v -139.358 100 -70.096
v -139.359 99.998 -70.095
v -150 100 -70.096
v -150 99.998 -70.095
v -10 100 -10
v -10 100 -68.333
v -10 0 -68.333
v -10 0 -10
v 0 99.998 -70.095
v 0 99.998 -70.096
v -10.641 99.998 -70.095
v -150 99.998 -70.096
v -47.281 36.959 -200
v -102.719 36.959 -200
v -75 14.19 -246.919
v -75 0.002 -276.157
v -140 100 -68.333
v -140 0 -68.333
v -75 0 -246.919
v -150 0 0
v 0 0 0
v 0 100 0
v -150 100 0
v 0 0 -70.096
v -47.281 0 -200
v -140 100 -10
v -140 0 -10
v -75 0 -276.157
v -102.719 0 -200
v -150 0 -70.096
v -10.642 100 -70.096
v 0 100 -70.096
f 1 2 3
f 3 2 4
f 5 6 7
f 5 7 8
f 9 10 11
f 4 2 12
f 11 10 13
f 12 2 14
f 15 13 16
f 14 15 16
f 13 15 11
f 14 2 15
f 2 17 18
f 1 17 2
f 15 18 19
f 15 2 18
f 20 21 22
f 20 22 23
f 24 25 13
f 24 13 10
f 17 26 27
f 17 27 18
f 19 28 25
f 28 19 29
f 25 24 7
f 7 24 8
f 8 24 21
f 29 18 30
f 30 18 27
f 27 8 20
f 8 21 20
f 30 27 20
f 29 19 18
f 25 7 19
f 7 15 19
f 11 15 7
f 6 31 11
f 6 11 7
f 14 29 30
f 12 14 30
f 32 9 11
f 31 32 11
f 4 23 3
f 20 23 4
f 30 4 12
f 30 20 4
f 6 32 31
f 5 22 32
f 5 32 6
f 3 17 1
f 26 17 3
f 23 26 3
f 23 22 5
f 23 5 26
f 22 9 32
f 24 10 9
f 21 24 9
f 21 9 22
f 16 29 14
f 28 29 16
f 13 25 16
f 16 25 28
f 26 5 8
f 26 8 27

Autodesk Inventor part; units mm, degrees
ref_plane "YZ Plane" through (0, 0, 0) normal (1, 0, 0) x (0, 1, 0)
ref_plane "XZ Plane" through (0, 0, 0) normal (0, 1, 0) x (-1, 0, 0)
sketch "Sketch2" plane through (0, 0, 0) normal (0, 1, 0) x (-1, 0, 0)
  line L0 (0, 0) -> (150, 0)
  line L1 (150, 0) -> (150, -70.0962)
  line L2 (0, -70.0962) -> (0, 0)
  line L3 (102.7189, -200) -> (47.2811, -200)
  line L4 (102.7189, -200) -> (150, -70.0962)
  line L5 (47.2811, -200) -> (0, -70.0962)
  line L6 (0, -70.0962) -> (0, -200)
  line L7 (150, -70.0962) -> (150, -200)
  line L8 (0, -200) -> (150, -200)
  line L9 (102.7189, -200) -> (75, -276.157)
  line L10 (47.2811, -200) -> (75, -276.157)
  dimension "d7" = 150
  dimension "d23" = 70.0962
  dimension "d24" = 200
  dimension "d36" = 20
  dimension "d37" = 20
extrude "Extrusion1" add sketch "Sketch2" along normal blind 100 contours L0 L1 L4 L3 L5 L2 | L3 L9 L10
sketch "Sketch11" plane through (0, 100, 0) normal (0, 1, 0) x (1, 0, 0)
  line L0 (0, 70.0962) -> (-75, 276.157) projected
  line L1 (-75, 276.157) -> (-150, 70.0962) projected
  line L2 (-150, 70.0962) -> (-150, 0) projected
  line L3 (-150, 0) -> (0, 0) projected
  line L4 (0, 0) -> (0, 70.0962) projected
  line L5 (-10, 68.3329) -> (-75, 246.919)
  line L6 (-75, 246.919) -> (-140, 68.3329)
  line L7 (-140, 68.3329) -> (-140, 10)
  line L8 (-140, 10) -> (-10, 10)
  line L9 (-10, 10) -> (-10, 68.3329)
  dimension "d46" = 10
extrude "Extrusion9" cut sketch "Sketch11" against normal blind 90 contours L9 L8 L7 L6 L5
ref_plane "Work Plane4" through (0, 100, -70.0962) normal (0, -0.8997, 0.4366) x (-1, 0, 0)
sketch "Sketch12" plane through (0, 100, -70.0962) normal (0, -0.8997, 0.4366) x (-1, 0, 0)
  line L0 (0, 0) -> (154.5136, 0)
  line L1 (154.5136, 0) -> (154.5136, 238.9342)
  line L2 (154.5136, 238.9342) -> (0, 238.9342)
  line L3 (0, 238.9342) -> (0, 0)
  point P0 (0, -19.4027)
extrude "Extrusion10" cut sketch "Sketch12" against normal blind 90
sketch "Sketch13" plane through (0, 10, 0) normal (0, 1, 0) x (1, 0, 0)
  line L0 (-140, 10) -> (-140, 68.3329) projected
  line L1 (-10, 10) -> (-140, 10) projected
  line L2 (-10, 68.3329) -> (-10, 10) projected
  line L3 (-75, 246.919) -> (-10, 68.3329) projected
  line L4 (-140, 68.3329) -> (-75, 246.919) projected
  circle A0 centre (-75, 222.9149) radius 2.5
  line L5 (-75, 222.9149) -> (-10, 44.3288)
  line L6 (-75, 222.9149) -> (97.0532, 222.9149) construction
  line L7 (-75, 222.9149) -> (-140, 44.3288)
  circle A1 centre (-71.5798, 213.518) radius 2.5
  circle A2 centre (-68.1596, 204.121) radius 2.5
  circle A3 centre (-64.7394, 194.7241) radius 2.5
  circle A4 centre (-61.3192, 185.3272) radius 2.5
  circle A5 centre (-57.899, 175.9302) radius 2.5
  circle A6 centre (-54.4788, 166.5333) radius 2.5
  circle A7 centre (-51.0586, 157.1364) radius 2.5
  circle A8 centre (-47.6384, 147.7395) radius 2.5
  circle A9 centre (-44.2182, 138.3425) radius 2.5
  circle A10 centre (-40.798, 128.9456) radius 2.5
  circle A11 centre (-37.3778, 119.5487) radius 2.5
  circle A12 centre (-78.4202, 213.518) radius 2.5
  circle A13 centre (-75, 204.121) radius 2.5
  circle A14 centre (-71.5798, 194.7241) radius 2.5
  circle A15 centre (-68.1596, 185.3272) radius 2.5
  circle A16 centre (-64.7394, 175.9302) radius 2.5
  circle A17 centre (-61.3192, 166.5333) radius 2.5
  circle A18 centre (-57.899, 157.1364) radius 2.5
  circle A19 centre (-54.4788, 147.7395) radius 2.5
  circle A20 centre (-51.0586, 138.3425) radius 2.5
  circle A21 centre (-47.6384, 128.9456) radius 2.5
  circle A22 centre (-44.2182, 119.5487) radius 2.5
  circle A23 centre (-40.798, 110.1518) radius 2.5
  circle A24 centre (-81.8404, 204.121) radius 2.5
  circle A25 centre (-78.4202, 194.7241) radius 2.5
  circle A26 centre (-75, 185.3272) radius 2.5
  circle A27 centre (-71.5798, 175.9302) radius 2.5
  circle A28 centre (-68.1596, 166.5333) radius 2.5
  circle A29 centre (-64.7394, 157.1364) radius 2.5
  circle A30 centre (-61.3192, 147.7395) radius 2.5
  circle A31 centre (-57.899, 138.3425) radius 2.5
  circle A32 centre (-54.4788, 128.9456) radius 2.5
  circle A33 centre (-51.0586, 119.5487) radius 2.5
  circle A34 centre (-47.6384, 110.1518) radius 2.5
  circle A35 centre (-44.2182, 100.7548) radius 2.5
  circle A36 centre (-85.2606, 194.7241) radius 2.5
  circle A37 centre (-81.8404, 185.3272) radius 2.5
  circle A38 centre (-78.4202, 175.9302) radius 2.5
  circle A39 centre (-75, 166.5333) radius 2.5
  circle A40 centre (-71.5798, 157.1364) radius 2.5
  circle A41 centre (-68.1596, 147.7395) radius 2.5
  circle A42 centre (-64.7394, 138.3425) radius 2.5
  circle A43 centre (-61.3192, 128.9456) radius 2.5
  circle A44 centre (-57.899, 119.5487) radius 2.5
  circle A45 centre (-54.4788, 110.1518) radius 2.5
  circle A46 centre (-51.0586, 100.7548) radius 2.5
  circle A47 centre (-47.6384, 91.3579) radius 2.5
  circle A48 centre (-88.6808, 185.3272) radius 2.5
  circle A49 centre (-85.2606, 175.9302) radius 2.5
  circle A50 centre (-81.8404, 166.5333) radius 2.5
  circle A51 centre (-78.4202, 157.1364) radius 2.5
  circle A52 centre (-75, 147.7395) radius 2.5
  circle A53 centre (-71.5798, 138.3425) radius 2.5
  circle A54 centre (-68.1596, 128.9456) radius 2.5
  circle A55 centre (-64.7394, 119.5487) radius 2.5
  circle A56 centre (-61.3192, 110.1518) radius 2.5
  circle A57 centre (-57.899, 100.7548) radius 2.5
  circle A58 centre (-54.4788, 91.3579) radius 2.5
  circle A59 centre (-51.0586, 81.961) radius 2.5
  circle A60 centre (-92.101, 175.9302) radius 2.5
  circle A61 centre (-88.6808, 166.5333) radius 2.5
  circle A62 centre (-85.2606, 157.1364) radius 2.5
  circle A63 centre (-81.8404, 147.7395) radius 2.5
  circle A64 centre (-78.4202, 138.3425) radius 2.5
  circle A65 centre (-75, 128.9456) radius 2.5
  circle A66 centre (-71.5798, 119.5487) radius 2.5
  circle A67 centre (-68.1596, 110.1518) radius 2.5
  circle A68 centre (-64.7394, 100.7548) radius 2.5
  circle A69 centre (-61.3192, 91.3579) radius 2.5
  circle A70 centre (-57.899, 81.961) radius 2.5
  circle A71 centre (-54.4788, 72.5641) radius 2.5
  circle A72 centre (-95.5212, 166.5333) radius 2.5
  circle A73 centre (-92.101, 157.1364) radius 2.5
  circle A74 centre (-88.6808, 147.7395) radius 2.5
  circle A75 centre (-85.2606, 138.3425) radius 2.5
  circle A76 centre (-81.8404, 128.9456) radius 2.5
  circle A77 centre (-78.4202, 119.5487) radius 2.5
  circle A78 centre (-75, 110.1518) radius 2.5
  circle A79 centre (-71.5798, 100.7548) radius 2.5
  circle A80 centre (-68.1596, 91.3579) radius 2.5
  circle A81 centre (-64.7394, 81.961) radius 2.5
  circle A82 centre (-61.3192, 72.5641) radius 2.5
  circle A83 centre (-57.899, 63.1671) radius 2.5
  circle A84 centre (-98.9414, 157.1364) radius 2.5
  circle A85 centre (-95.5212, 147.7395) radius 2.5
  circle A86 centre (-92.101, 138.3425) radius 2.5
  circle A87 centre (-88.6808, 128.9456) radius 2.5
  circle A88 centre (-85.2606, 119.5487) radius 2.5
  circle A89 centre (-81.8404, 110.1518) radius 2.5
  circle A90 centre (-78.4202, 100.7548) radius 2.5
  circle A91 centre (-75, 91.3579) radius 2.5
  circle A92 centre (-71.5798, 81.961) radius 2.5
  circle A93 centre (-68.1596, 72.5641) radius 2.5
  circle A94 centre (-64.7394, 63.1671) radius 2.5
  circle A95 centre (-61.3192, 53.7702) radius 2.5
  circle A96 centre (-102.3616, 147.7395) radius 2.5
  circle A97 centre (-98.9414, 138.3425) radius 2.5
  circle A98 centre (-95.5212, 128.9456) radius 2.5
  circle A99 centre (-92.101, 119.5487) radius 2.5
  circle A100 centre (-88.6808, 110.1518) radius 2.5
  circle A101 centre (-85.2606, 100.7548) radius 2.5
  circle A102 centre (-81.8404, 91.3579) radius 2.5
  circle A103 centre (-78.4202, 81.961) radius 2.5
  circle A104 centre (-75, 72.5641) radius 2.5
  circle A105 centre (-71.5798, 63.1671) radius 2.5
  circle A106 centre (-68.1596, 53.7702) radius 2.5
  circle A107 centre (-64.7394, 44.3733) radius 2.5
  circle A108 centre (-105.7818, 138.3425) radius 2.5
  circle A109 centre (-102.3616, 128.9456) radius 2.5
  circle A110 centre (-98.9414, 119.5487) radius 2.5
  circle A111 centre (-95.5212, 110.1518) radius 2.5
  circle A112 centre (-92.101, 100.7548) radius 2.5
  circle A113 centre (-88.6808, 91.3579) radius 2.5
  circle A114 centre (-85.2606, 81.961) radius 2.5
  circle A115 centre (-81.8404, 72.5641) radius 2.5
  circle A116 centre (-78.4202, 63.1671) radius 2.5
  circle A117 centre (-75, 53.7702) radius 2.5
  circle A118 centre (-71.5798, 44.3733) radius 2.5
  circle A119 centre (-68.1596, 34.9764) radius 2.5
  circle A120 centre (-109.202, 128.9456) radius 2.5
  circle A121 centre (-105.7818, 119.5487) radius 2.5
  circle A122 centre (-102.3616, 110.1518) radius 2.5
  circle A123 centre (-98.9414, 100.7548) radius 2.5
  circle A124 centre (-95.5212, 91.3579) radius 2.5
  circle A125 centre (-92.101, 81.961) radius 2.5
  circle A126 centre (-88.6808, 72.5641) radius 2.5
  circle A127 centre (-85.2606, 63.1671) radius 2.5
  circle A128 centre (-81.8404, 53.7702) radius 2.5
  circle A129 centre (-78.4202, 44.3733) radius 2.5
  circle A130 centre (-75, 34.9764) radius 2.5
  circle A131 centre (-71.5798, 25.5794) radius 2.5
  circle A132 centre (-112.6222, 119.5487) radius 2.5
  circle A133 centre (-109.202, 110.1518) radius 2.5
  circle A134 centre (-105.7818, 100.7548) radius 2.5
  circle A135 centre (-102.3616, 91.3579) radius 2.5
  circle A136 centre (-98.9414, 81.961) radius 2.5
  circle A137 centre (-95.5212, 72.5641) radius 2.5
  circle A138 centre (-92.101, 63.1671) radius 2.5
  circle A139 centre (-88.6808, 53.7702) radius 2.5
  circle A140 centre (-85.2606, 44.3733) radius 2.5
  circle A141 centre (-81.8404, 34.9764) radius 2.5
  circle A142 centre (-78.4202, 25.5794) radius 2.5
  circle A143 centre (-75, 16.1825) radius 2.5
  point P0 (0, 0)
  dimension "d51" = 5
  dimension "d52" = 70
  dimension "d53" = 70
  dimension "d56" = 10
  dimension "d59" = 10
extrude "Extrusion11" cut sketch "Sketch13" against normal through all contours A132 L7 | L7 A132 | A11 L5 | L5 A11 | A120 L7 | L7 A120 | A10 L5 | L5 A10 | A108 L7 | L7 A108 | A9 L5 | L5 A9 | A96 L7 | L7 A96 | A8 L5 | L5 A8 | A84 L7 | L7 A84 | A7 L5 | L5 A7 | A72 L7 | L7 A72 | A6 L5 | L5 A6 | A60 L7 | L7 A60 | A5 L5 | L5 A5 | A48 L7 | L7 A48 | A4 L5 | L5 A4 | A36 L7 | L7 A36 | A3 L5 | L5 A3 | A24 L7 | L7 A24 | A2 L5 | L5 A2 | A12 L7 | L7 A12 | A1 L5 | L5 A1 | L7 L5 A0 | A0 L5 L7 | A13 | A14 | A15 | A16 | A17 | A18 | A19 | A20 | A21 | A22 | A23 | A25 | A26 | A27 | A28 | A29 | A30 | A31 | A32 | A33 | A34 | A35 | A37 | A38 | A39 | A40 | A41 | A42 | A43 | A44 | A45 | A46 | A47 | A49 | A50 | A51 | A52 | A53 | A54 | A55 | A56 | A57 | A58 | A59 | A61 | A62 | A63 | A64 | A65 | A66 | A67 | A68 | A69 | A70 | A71 | A73 | A74 | A75 | A76 | A77 | A78 | A79 | A80 | A81 | A82 | A83 | A85 | A86 | A87 | A88 | A89 | A90 | A91 | A92 | A93 | A94 | A95 | A97 | A98 | A99 | A100 | A101 | A102 | A103 | A104 | A105 | A107 | A109 | A110 | A111 | A112 | A113 | A114 | A115 | A116 | A117 | A118 | A119 | A121 | A122 | A123 | A124 | A125 | A126 | A127 | A128 | A129 | A130 | A131 | A133 | A134 | A135 | A136 | A137 | A138 | A139 | A140 | A141 | A142 | A143
sketch "Sketch15" plane through (0, 10, 0) normal (0, 1, 0) x (1, 0, 0)
  circle A0 centre (-68.1596, 204.121) radius 2.5 projected
  circle A1 centre (-78.4202, 213.518) radius 2.5 projected
  circle A2 centre (-92.101, 175.9302) radius 2.5 projected
  circle A3 centre (-71.5798, 175.9302) radius 2.5 projected
  circle A4 centre (-68.1596, 185.3272) radius 2.5 projected
  circle A5 centre (-95.5212, 128.9456) radius 2.5 projected
  circle A6 centre (-92.101, 157.1364) radius 2.5 projected
  circle A7 centre (-92.101, 138.3425) radius 2.5 projected
  circle A8 centre (-102.3616, 147.7395) radius 2.5 projected
  circle A9 centre (-57.899, 157.1364) radius 2.5 projected
  circle A10 centre (-61.3192, 147.7395) radius 2.5 projected
  circle A11 centre (-71.5798, 157.1364) radius 2.5 projected
  circle A12 centre (-81.8404, 166.5333) radius 2.5 projected
  circle A13 centre (-68.1596, 128.9456) radius 2.5 projected
  circle A14 centre (-81.8404, 128.9456) radius 2.5 projected
  circle A15 centre (-85.2606, 100.7548) radius 2.5 projected
  circle A16 centre (-88.6808, 91.3579) radius 2.5 projected
  circle A17 centre (-92.101, 81.961) radius 2.5 projected
  circle A18 centre (-105.7818, 100.7548) radius 2.5 projected
  circle A19 centre (-112.6222, 119.5487) radius 2.5 projected
  circle A20 centre (-54.4788, 110.1518) radius 2.5 projected
  circle A21 centre (-54.4788, 91.3579) radius 2.5 projected
  circle A22 centre (-61.3192, 91.3579) radius 2.5 projected
  circle A23 centre (-71.5798, 100.7548) radius 2.5 projected
  circle A24 centre (-78.4202, 100.7548) radius 2.5 projected
  circle A25 centre (-75, 34.9764) radius 2.5 projected
  circle A26 centre (-75, 16.1825) radius 2.5 projected
  circle A27 centre (-54.4788, 72.5641) radius 2.5 projected
  circle A28 centre (-78.4202, 63.1671) radius 2.5 projected
  circle A29 centre (-95.5212, 72.5641) radius 2.5 projected
  circle A30 centre (-75, 53.7702) radius 2.5 projected
  circle A31 centre (-75, 72.5641) radius 2.5 projected
  circle A32 centre (-44.2182, 138.3425) radius 2.5 projected
  circle A33 centre (-47.6384, 91.3579) radius 2.5 projected
  circle A34 centre (-51.0586, 119.5487) radius 2.5 projected
  circle A35 centre (-51.0586, 138.3425) radius 2.5 projected
  circle A36 centre (-40.798, 110.1518) radius 2.5 projected
  circle A37 centre (-51.0586, 100.7548) radius 2.5 projected
  circle A38 centre (-40.798, 128.9456) radius 2.5 projected
  circle A39 centre (-61.3192, 53.7702) radius 2.5 projected
  circle A40 centre (-81.8404, 72.5641) radius 2.5 projected
  circle A41 centre (-88.6808, 53.7702) radius 2.5 projected
  circle A42 centre (-71.5798, 44.3733) radius 2.5 projected
  circle A43 centre (-64.7394, 63.1671) radius 2.5 projected
  circle A44 centre (-68.1596, 72.5641) radius 2.5 projected
  circle A45 centre (-71.5798, 25.5794) radius 2.5 projected
  circle A46 centre (-75, 91.3579) radius 2.5 projected
  circle A47 centre (-68.1596, 91.3579) radius 2.5 projected
  circle A48 centre (-57.899, 81.961) radius 2.5 projected
  circle A49 centre (-71.5798, 119.5487) radius 2.5 projected
  circle A50 centre (-64.7394, 119.5487) radius 2.5 projected
  circle A51 centre (-81.8404, 91.3579) radius 2.5 projected
  circle A52 centre (-95.5212, 91.3579) radius 2.5 projected
  circle A53 centre (-109.202, 110.1518) radius 2.5 projected
  circle A54 centre (-85.2606, 81.961) radius 2.5 projected
  circle A55 centre (-98.9414, 119.5487) radius 2.5 projected
  circle A56 centre (-54.4788, 166.5333) radius 2.5 projected
  circle A57 centre (-81.8404, 147.7395) radius 2.5 projected
  circle A58 centre (-78.4202, 157.1364) radius 2.5 projected
  circle A59 centre (-68.1596, 147.7395) radius 2.5 projected
  circle A60 centre (-57.899, 138.3425) radius 2.5 projected
  circle A61 centre (-54.4788, 147.7395) radius 2.5 projected
  circle A62 centre (-98.9414, 157.1364) radius 2.5 projected
  circle A63 centre (-88.6808, 128.9456) radius 2.5 projected
  circle A64 centre (-88.6808, 147.7395) radius 2.5 projected
  circle A65 centre (-102.3616, 128.9456) radius 2.5 projected
  circle A66 centre (-71.5798, 194.7241) radius 2.5 projected
  circle A67 centre (-75, 185.3272) radius 2.5 projected
  circle A68 centre (-85.2606, 175.9302) radius 2.5 projected
  circle A69 centre (-81.8404, 204.121) radius 2.5 projected
  circle A70 centre (-64.7394, 194.7241) radius 2.5 projected
  circle A71 centre (-71.5798, 213.518) radius 2.5 projected
  circle A72 centre (-57.899, 175.9302) radius 2.5 projected
  circle A73 centre (-88.6808, 185.3272) radius 2.5 projected
  circle A74 centre (-81.8404, 185.3272) radius 2.5 projected
  circle A75 centre (-64.7394, 175.9302) radius 2.5 projected
  circle A76 centre (-98.9414, 138.3425) radius 2.5 projected
  circle A77 centre (-85.2606, 157.1364) radius 2.5 projected
  circle A78 centre (-95.5212, 147.7395) radius 2.5 projected
  circle A79 centre (-105.7818, 138.3425) radius 2.5 projected
  circle A80 centre (-61.3192, 166.5333) radius 2.5 projected
  circle A81 centre (-64.7394, 157.1364) radius 2.5 projected
  circle A82 centre (-75, 166.5333) radius 2.5 projected
  circle A83 centre (-61.3192, 128.9456) radius 2.5 projected
  circle A84 centre (-71.5798, 138.3425) radius 2.5 projected
  circle A85 centre (-75, 128.9456) radius 2.5 projected
  circle A86 centre (-88.6808, 110.1518) radius 2.5 projected
  circle A87 centre (-92.101, 100.7548) radius 2.5 projected
  circle A88 centre (-98.9414, 100.7548) radius 2.5 projected
  circle A89 centre (-98.9414, 81.961) radius 2.5 projected
  circle A90 centre (-85.2606, 119.5487) radius 2.5 projected
  circle A91 centre (-57.899, 119.5487) radius 2.5 projected
  circle A92 centre (-57.899, 100.7548) radius 2.5 projected
  circle A93 centre (-64.7394, 100.7548) radius 2.5 projected
  circle A94 centre (-75, 110.1518) radius 2.5 projected
  circle A95 centre (-81.8404, 110.1518) radius 2.5 projected
  circle A96 centre (-68.1596, 34.9764) radius 2.5 projected
  circle A97 centre (-78.4202, 25.5794) radius 2.5 projected
  circle A98 centre (-61.3192, 72.5641) radius 2.5 projected
  circle A99 centre (-85.2606, 44.3733) radius 2.5 projected
  circle A100 centre (-81.8404, 53.7702) radius 2.5 projected
  circle A101 centre (-85.2606, 63.1671) radius 2.5 projected
  circle A102 centre (-71.5798, 63.1671) radius 2.5 projected
  circle A103 centre (-47.6384, 147.7395) radius 2.5 projected
  circle A104 centre (-51.0586, 81.961) radius 2.5 projected
  circle A105 centre (-47.6384, 110.1518) radius 2.5 projected
  circle A106 centre (-47.6384, 128.9456) radius 2.5 projected
  circle A107 centre (-44.2182, 119.5487) radius 2.5 projected
  circle A108 centre (-44.2182, 100.7548) radius 2.5 projected
  circle A109 centre (-37.3778, 119.5487) radius 2.5 projected
  circle A110 centre (-51.0586, 157.1364) radius 2.5 projected
  circle A111 centre (-64.7394, 44.3733) radius 2.5 projected
  circle A112 centre (-78.4202, 44.3733) radius 2.5 projected
  circle A113 centre (-88.6808, 72.5641) radius 2.5 projected
  circle A114 centre (-92.101, 63.1671) radius 2.5 projected
  circle A115 centre (-57.899, 63.1671) radius 2.5 projected
  circle A116 centre (-81.8404, 34.9764) radius 2.5 projected
  circle A117 centre (-71.5798, 81.961) radius 2.5 projected
  circle A118 centre (-64.7394, 81.961) radius 2.5 projected
  circle A119 centre (-78.4202, 119.5487) radius 2.5 projected
  circle A120 centre (-68.1596, 110.1518) radius 2.5 projected
  circle A121 centre (-61.3192, 110.1518) radius 2.5 projected
  circle A122 centre (-78.4202, 81.961) radius 2.5 projected
  circle A123 centre (-102.3616, 110.1518) radius 2.5 projected
  circle A124 centre (-102.3616, 91.3579) radius 2.5 projected
  circle A125 centre (-105.7818, 119.5487) radius 2.5 projected
  circle A126 centre (-95.5212, 110.1518) radius 2.5 projected
  circle A127 centre (-92.101, 119.5487) radius 2.5 projected
  circle A128 centre (-78.4202, 138.3425) radius 2.5 projected
  circle A129 centre (-75, 147.7395) radius 2.5 projected
  circle A130 centre (-64.7394, 138.3425) radius 2.5 projected
  circle A131 centre (-54.4788, 128.9456) radius 2.5 projected
  circle A132 centre (-68.1596, 166.5333) radius 2.5 projected
  circle A133 centre (-95.5212, 166.5333) radius 2.5 projected
  circle A134 centre (-109.202, 128.9456) radius 2.5 projected
  circle A135 centre (-85.2606, 138.3425) radius 2.5 projected
  circle A136 centre (-88.6808, 166.5333) radius 2.5 projected
  circle A137 centre (-75, 204.121) radius 2.5 projected
  circle A138 centre (-78.4202, 194.7241) radius 2.5 projected
  circle A139 centre (-78.4202, 175.9302) radius 2.5 projected
  circle A140 centre (-85.2606, 194.7241) radius 2.5 projected
  circle A141 centre (-61.3192, 185.3272) radius 2.5 projected
  circle A142 centre (-75, 222.9149) radius 2.5 projected
  line L0 (-140, 10) -> (-140, 68.3329) projected
  line L1 (-10, 10) -> (-140, 10) projected
  line L2 (-10, 68.3329) -> (-10, 10) projected
  line L3 (-75, 246.919) -> (-10, 68.3329) projected
  line L4 (-140, 68.3329) -> (-75, 246.919) projected
  point P0 (0, 0)
extrude "Extrusion13" cut sketch "Sketch15" against normal blind 90
properties part number "Wedge_wall" material "Aluminum 6061"
